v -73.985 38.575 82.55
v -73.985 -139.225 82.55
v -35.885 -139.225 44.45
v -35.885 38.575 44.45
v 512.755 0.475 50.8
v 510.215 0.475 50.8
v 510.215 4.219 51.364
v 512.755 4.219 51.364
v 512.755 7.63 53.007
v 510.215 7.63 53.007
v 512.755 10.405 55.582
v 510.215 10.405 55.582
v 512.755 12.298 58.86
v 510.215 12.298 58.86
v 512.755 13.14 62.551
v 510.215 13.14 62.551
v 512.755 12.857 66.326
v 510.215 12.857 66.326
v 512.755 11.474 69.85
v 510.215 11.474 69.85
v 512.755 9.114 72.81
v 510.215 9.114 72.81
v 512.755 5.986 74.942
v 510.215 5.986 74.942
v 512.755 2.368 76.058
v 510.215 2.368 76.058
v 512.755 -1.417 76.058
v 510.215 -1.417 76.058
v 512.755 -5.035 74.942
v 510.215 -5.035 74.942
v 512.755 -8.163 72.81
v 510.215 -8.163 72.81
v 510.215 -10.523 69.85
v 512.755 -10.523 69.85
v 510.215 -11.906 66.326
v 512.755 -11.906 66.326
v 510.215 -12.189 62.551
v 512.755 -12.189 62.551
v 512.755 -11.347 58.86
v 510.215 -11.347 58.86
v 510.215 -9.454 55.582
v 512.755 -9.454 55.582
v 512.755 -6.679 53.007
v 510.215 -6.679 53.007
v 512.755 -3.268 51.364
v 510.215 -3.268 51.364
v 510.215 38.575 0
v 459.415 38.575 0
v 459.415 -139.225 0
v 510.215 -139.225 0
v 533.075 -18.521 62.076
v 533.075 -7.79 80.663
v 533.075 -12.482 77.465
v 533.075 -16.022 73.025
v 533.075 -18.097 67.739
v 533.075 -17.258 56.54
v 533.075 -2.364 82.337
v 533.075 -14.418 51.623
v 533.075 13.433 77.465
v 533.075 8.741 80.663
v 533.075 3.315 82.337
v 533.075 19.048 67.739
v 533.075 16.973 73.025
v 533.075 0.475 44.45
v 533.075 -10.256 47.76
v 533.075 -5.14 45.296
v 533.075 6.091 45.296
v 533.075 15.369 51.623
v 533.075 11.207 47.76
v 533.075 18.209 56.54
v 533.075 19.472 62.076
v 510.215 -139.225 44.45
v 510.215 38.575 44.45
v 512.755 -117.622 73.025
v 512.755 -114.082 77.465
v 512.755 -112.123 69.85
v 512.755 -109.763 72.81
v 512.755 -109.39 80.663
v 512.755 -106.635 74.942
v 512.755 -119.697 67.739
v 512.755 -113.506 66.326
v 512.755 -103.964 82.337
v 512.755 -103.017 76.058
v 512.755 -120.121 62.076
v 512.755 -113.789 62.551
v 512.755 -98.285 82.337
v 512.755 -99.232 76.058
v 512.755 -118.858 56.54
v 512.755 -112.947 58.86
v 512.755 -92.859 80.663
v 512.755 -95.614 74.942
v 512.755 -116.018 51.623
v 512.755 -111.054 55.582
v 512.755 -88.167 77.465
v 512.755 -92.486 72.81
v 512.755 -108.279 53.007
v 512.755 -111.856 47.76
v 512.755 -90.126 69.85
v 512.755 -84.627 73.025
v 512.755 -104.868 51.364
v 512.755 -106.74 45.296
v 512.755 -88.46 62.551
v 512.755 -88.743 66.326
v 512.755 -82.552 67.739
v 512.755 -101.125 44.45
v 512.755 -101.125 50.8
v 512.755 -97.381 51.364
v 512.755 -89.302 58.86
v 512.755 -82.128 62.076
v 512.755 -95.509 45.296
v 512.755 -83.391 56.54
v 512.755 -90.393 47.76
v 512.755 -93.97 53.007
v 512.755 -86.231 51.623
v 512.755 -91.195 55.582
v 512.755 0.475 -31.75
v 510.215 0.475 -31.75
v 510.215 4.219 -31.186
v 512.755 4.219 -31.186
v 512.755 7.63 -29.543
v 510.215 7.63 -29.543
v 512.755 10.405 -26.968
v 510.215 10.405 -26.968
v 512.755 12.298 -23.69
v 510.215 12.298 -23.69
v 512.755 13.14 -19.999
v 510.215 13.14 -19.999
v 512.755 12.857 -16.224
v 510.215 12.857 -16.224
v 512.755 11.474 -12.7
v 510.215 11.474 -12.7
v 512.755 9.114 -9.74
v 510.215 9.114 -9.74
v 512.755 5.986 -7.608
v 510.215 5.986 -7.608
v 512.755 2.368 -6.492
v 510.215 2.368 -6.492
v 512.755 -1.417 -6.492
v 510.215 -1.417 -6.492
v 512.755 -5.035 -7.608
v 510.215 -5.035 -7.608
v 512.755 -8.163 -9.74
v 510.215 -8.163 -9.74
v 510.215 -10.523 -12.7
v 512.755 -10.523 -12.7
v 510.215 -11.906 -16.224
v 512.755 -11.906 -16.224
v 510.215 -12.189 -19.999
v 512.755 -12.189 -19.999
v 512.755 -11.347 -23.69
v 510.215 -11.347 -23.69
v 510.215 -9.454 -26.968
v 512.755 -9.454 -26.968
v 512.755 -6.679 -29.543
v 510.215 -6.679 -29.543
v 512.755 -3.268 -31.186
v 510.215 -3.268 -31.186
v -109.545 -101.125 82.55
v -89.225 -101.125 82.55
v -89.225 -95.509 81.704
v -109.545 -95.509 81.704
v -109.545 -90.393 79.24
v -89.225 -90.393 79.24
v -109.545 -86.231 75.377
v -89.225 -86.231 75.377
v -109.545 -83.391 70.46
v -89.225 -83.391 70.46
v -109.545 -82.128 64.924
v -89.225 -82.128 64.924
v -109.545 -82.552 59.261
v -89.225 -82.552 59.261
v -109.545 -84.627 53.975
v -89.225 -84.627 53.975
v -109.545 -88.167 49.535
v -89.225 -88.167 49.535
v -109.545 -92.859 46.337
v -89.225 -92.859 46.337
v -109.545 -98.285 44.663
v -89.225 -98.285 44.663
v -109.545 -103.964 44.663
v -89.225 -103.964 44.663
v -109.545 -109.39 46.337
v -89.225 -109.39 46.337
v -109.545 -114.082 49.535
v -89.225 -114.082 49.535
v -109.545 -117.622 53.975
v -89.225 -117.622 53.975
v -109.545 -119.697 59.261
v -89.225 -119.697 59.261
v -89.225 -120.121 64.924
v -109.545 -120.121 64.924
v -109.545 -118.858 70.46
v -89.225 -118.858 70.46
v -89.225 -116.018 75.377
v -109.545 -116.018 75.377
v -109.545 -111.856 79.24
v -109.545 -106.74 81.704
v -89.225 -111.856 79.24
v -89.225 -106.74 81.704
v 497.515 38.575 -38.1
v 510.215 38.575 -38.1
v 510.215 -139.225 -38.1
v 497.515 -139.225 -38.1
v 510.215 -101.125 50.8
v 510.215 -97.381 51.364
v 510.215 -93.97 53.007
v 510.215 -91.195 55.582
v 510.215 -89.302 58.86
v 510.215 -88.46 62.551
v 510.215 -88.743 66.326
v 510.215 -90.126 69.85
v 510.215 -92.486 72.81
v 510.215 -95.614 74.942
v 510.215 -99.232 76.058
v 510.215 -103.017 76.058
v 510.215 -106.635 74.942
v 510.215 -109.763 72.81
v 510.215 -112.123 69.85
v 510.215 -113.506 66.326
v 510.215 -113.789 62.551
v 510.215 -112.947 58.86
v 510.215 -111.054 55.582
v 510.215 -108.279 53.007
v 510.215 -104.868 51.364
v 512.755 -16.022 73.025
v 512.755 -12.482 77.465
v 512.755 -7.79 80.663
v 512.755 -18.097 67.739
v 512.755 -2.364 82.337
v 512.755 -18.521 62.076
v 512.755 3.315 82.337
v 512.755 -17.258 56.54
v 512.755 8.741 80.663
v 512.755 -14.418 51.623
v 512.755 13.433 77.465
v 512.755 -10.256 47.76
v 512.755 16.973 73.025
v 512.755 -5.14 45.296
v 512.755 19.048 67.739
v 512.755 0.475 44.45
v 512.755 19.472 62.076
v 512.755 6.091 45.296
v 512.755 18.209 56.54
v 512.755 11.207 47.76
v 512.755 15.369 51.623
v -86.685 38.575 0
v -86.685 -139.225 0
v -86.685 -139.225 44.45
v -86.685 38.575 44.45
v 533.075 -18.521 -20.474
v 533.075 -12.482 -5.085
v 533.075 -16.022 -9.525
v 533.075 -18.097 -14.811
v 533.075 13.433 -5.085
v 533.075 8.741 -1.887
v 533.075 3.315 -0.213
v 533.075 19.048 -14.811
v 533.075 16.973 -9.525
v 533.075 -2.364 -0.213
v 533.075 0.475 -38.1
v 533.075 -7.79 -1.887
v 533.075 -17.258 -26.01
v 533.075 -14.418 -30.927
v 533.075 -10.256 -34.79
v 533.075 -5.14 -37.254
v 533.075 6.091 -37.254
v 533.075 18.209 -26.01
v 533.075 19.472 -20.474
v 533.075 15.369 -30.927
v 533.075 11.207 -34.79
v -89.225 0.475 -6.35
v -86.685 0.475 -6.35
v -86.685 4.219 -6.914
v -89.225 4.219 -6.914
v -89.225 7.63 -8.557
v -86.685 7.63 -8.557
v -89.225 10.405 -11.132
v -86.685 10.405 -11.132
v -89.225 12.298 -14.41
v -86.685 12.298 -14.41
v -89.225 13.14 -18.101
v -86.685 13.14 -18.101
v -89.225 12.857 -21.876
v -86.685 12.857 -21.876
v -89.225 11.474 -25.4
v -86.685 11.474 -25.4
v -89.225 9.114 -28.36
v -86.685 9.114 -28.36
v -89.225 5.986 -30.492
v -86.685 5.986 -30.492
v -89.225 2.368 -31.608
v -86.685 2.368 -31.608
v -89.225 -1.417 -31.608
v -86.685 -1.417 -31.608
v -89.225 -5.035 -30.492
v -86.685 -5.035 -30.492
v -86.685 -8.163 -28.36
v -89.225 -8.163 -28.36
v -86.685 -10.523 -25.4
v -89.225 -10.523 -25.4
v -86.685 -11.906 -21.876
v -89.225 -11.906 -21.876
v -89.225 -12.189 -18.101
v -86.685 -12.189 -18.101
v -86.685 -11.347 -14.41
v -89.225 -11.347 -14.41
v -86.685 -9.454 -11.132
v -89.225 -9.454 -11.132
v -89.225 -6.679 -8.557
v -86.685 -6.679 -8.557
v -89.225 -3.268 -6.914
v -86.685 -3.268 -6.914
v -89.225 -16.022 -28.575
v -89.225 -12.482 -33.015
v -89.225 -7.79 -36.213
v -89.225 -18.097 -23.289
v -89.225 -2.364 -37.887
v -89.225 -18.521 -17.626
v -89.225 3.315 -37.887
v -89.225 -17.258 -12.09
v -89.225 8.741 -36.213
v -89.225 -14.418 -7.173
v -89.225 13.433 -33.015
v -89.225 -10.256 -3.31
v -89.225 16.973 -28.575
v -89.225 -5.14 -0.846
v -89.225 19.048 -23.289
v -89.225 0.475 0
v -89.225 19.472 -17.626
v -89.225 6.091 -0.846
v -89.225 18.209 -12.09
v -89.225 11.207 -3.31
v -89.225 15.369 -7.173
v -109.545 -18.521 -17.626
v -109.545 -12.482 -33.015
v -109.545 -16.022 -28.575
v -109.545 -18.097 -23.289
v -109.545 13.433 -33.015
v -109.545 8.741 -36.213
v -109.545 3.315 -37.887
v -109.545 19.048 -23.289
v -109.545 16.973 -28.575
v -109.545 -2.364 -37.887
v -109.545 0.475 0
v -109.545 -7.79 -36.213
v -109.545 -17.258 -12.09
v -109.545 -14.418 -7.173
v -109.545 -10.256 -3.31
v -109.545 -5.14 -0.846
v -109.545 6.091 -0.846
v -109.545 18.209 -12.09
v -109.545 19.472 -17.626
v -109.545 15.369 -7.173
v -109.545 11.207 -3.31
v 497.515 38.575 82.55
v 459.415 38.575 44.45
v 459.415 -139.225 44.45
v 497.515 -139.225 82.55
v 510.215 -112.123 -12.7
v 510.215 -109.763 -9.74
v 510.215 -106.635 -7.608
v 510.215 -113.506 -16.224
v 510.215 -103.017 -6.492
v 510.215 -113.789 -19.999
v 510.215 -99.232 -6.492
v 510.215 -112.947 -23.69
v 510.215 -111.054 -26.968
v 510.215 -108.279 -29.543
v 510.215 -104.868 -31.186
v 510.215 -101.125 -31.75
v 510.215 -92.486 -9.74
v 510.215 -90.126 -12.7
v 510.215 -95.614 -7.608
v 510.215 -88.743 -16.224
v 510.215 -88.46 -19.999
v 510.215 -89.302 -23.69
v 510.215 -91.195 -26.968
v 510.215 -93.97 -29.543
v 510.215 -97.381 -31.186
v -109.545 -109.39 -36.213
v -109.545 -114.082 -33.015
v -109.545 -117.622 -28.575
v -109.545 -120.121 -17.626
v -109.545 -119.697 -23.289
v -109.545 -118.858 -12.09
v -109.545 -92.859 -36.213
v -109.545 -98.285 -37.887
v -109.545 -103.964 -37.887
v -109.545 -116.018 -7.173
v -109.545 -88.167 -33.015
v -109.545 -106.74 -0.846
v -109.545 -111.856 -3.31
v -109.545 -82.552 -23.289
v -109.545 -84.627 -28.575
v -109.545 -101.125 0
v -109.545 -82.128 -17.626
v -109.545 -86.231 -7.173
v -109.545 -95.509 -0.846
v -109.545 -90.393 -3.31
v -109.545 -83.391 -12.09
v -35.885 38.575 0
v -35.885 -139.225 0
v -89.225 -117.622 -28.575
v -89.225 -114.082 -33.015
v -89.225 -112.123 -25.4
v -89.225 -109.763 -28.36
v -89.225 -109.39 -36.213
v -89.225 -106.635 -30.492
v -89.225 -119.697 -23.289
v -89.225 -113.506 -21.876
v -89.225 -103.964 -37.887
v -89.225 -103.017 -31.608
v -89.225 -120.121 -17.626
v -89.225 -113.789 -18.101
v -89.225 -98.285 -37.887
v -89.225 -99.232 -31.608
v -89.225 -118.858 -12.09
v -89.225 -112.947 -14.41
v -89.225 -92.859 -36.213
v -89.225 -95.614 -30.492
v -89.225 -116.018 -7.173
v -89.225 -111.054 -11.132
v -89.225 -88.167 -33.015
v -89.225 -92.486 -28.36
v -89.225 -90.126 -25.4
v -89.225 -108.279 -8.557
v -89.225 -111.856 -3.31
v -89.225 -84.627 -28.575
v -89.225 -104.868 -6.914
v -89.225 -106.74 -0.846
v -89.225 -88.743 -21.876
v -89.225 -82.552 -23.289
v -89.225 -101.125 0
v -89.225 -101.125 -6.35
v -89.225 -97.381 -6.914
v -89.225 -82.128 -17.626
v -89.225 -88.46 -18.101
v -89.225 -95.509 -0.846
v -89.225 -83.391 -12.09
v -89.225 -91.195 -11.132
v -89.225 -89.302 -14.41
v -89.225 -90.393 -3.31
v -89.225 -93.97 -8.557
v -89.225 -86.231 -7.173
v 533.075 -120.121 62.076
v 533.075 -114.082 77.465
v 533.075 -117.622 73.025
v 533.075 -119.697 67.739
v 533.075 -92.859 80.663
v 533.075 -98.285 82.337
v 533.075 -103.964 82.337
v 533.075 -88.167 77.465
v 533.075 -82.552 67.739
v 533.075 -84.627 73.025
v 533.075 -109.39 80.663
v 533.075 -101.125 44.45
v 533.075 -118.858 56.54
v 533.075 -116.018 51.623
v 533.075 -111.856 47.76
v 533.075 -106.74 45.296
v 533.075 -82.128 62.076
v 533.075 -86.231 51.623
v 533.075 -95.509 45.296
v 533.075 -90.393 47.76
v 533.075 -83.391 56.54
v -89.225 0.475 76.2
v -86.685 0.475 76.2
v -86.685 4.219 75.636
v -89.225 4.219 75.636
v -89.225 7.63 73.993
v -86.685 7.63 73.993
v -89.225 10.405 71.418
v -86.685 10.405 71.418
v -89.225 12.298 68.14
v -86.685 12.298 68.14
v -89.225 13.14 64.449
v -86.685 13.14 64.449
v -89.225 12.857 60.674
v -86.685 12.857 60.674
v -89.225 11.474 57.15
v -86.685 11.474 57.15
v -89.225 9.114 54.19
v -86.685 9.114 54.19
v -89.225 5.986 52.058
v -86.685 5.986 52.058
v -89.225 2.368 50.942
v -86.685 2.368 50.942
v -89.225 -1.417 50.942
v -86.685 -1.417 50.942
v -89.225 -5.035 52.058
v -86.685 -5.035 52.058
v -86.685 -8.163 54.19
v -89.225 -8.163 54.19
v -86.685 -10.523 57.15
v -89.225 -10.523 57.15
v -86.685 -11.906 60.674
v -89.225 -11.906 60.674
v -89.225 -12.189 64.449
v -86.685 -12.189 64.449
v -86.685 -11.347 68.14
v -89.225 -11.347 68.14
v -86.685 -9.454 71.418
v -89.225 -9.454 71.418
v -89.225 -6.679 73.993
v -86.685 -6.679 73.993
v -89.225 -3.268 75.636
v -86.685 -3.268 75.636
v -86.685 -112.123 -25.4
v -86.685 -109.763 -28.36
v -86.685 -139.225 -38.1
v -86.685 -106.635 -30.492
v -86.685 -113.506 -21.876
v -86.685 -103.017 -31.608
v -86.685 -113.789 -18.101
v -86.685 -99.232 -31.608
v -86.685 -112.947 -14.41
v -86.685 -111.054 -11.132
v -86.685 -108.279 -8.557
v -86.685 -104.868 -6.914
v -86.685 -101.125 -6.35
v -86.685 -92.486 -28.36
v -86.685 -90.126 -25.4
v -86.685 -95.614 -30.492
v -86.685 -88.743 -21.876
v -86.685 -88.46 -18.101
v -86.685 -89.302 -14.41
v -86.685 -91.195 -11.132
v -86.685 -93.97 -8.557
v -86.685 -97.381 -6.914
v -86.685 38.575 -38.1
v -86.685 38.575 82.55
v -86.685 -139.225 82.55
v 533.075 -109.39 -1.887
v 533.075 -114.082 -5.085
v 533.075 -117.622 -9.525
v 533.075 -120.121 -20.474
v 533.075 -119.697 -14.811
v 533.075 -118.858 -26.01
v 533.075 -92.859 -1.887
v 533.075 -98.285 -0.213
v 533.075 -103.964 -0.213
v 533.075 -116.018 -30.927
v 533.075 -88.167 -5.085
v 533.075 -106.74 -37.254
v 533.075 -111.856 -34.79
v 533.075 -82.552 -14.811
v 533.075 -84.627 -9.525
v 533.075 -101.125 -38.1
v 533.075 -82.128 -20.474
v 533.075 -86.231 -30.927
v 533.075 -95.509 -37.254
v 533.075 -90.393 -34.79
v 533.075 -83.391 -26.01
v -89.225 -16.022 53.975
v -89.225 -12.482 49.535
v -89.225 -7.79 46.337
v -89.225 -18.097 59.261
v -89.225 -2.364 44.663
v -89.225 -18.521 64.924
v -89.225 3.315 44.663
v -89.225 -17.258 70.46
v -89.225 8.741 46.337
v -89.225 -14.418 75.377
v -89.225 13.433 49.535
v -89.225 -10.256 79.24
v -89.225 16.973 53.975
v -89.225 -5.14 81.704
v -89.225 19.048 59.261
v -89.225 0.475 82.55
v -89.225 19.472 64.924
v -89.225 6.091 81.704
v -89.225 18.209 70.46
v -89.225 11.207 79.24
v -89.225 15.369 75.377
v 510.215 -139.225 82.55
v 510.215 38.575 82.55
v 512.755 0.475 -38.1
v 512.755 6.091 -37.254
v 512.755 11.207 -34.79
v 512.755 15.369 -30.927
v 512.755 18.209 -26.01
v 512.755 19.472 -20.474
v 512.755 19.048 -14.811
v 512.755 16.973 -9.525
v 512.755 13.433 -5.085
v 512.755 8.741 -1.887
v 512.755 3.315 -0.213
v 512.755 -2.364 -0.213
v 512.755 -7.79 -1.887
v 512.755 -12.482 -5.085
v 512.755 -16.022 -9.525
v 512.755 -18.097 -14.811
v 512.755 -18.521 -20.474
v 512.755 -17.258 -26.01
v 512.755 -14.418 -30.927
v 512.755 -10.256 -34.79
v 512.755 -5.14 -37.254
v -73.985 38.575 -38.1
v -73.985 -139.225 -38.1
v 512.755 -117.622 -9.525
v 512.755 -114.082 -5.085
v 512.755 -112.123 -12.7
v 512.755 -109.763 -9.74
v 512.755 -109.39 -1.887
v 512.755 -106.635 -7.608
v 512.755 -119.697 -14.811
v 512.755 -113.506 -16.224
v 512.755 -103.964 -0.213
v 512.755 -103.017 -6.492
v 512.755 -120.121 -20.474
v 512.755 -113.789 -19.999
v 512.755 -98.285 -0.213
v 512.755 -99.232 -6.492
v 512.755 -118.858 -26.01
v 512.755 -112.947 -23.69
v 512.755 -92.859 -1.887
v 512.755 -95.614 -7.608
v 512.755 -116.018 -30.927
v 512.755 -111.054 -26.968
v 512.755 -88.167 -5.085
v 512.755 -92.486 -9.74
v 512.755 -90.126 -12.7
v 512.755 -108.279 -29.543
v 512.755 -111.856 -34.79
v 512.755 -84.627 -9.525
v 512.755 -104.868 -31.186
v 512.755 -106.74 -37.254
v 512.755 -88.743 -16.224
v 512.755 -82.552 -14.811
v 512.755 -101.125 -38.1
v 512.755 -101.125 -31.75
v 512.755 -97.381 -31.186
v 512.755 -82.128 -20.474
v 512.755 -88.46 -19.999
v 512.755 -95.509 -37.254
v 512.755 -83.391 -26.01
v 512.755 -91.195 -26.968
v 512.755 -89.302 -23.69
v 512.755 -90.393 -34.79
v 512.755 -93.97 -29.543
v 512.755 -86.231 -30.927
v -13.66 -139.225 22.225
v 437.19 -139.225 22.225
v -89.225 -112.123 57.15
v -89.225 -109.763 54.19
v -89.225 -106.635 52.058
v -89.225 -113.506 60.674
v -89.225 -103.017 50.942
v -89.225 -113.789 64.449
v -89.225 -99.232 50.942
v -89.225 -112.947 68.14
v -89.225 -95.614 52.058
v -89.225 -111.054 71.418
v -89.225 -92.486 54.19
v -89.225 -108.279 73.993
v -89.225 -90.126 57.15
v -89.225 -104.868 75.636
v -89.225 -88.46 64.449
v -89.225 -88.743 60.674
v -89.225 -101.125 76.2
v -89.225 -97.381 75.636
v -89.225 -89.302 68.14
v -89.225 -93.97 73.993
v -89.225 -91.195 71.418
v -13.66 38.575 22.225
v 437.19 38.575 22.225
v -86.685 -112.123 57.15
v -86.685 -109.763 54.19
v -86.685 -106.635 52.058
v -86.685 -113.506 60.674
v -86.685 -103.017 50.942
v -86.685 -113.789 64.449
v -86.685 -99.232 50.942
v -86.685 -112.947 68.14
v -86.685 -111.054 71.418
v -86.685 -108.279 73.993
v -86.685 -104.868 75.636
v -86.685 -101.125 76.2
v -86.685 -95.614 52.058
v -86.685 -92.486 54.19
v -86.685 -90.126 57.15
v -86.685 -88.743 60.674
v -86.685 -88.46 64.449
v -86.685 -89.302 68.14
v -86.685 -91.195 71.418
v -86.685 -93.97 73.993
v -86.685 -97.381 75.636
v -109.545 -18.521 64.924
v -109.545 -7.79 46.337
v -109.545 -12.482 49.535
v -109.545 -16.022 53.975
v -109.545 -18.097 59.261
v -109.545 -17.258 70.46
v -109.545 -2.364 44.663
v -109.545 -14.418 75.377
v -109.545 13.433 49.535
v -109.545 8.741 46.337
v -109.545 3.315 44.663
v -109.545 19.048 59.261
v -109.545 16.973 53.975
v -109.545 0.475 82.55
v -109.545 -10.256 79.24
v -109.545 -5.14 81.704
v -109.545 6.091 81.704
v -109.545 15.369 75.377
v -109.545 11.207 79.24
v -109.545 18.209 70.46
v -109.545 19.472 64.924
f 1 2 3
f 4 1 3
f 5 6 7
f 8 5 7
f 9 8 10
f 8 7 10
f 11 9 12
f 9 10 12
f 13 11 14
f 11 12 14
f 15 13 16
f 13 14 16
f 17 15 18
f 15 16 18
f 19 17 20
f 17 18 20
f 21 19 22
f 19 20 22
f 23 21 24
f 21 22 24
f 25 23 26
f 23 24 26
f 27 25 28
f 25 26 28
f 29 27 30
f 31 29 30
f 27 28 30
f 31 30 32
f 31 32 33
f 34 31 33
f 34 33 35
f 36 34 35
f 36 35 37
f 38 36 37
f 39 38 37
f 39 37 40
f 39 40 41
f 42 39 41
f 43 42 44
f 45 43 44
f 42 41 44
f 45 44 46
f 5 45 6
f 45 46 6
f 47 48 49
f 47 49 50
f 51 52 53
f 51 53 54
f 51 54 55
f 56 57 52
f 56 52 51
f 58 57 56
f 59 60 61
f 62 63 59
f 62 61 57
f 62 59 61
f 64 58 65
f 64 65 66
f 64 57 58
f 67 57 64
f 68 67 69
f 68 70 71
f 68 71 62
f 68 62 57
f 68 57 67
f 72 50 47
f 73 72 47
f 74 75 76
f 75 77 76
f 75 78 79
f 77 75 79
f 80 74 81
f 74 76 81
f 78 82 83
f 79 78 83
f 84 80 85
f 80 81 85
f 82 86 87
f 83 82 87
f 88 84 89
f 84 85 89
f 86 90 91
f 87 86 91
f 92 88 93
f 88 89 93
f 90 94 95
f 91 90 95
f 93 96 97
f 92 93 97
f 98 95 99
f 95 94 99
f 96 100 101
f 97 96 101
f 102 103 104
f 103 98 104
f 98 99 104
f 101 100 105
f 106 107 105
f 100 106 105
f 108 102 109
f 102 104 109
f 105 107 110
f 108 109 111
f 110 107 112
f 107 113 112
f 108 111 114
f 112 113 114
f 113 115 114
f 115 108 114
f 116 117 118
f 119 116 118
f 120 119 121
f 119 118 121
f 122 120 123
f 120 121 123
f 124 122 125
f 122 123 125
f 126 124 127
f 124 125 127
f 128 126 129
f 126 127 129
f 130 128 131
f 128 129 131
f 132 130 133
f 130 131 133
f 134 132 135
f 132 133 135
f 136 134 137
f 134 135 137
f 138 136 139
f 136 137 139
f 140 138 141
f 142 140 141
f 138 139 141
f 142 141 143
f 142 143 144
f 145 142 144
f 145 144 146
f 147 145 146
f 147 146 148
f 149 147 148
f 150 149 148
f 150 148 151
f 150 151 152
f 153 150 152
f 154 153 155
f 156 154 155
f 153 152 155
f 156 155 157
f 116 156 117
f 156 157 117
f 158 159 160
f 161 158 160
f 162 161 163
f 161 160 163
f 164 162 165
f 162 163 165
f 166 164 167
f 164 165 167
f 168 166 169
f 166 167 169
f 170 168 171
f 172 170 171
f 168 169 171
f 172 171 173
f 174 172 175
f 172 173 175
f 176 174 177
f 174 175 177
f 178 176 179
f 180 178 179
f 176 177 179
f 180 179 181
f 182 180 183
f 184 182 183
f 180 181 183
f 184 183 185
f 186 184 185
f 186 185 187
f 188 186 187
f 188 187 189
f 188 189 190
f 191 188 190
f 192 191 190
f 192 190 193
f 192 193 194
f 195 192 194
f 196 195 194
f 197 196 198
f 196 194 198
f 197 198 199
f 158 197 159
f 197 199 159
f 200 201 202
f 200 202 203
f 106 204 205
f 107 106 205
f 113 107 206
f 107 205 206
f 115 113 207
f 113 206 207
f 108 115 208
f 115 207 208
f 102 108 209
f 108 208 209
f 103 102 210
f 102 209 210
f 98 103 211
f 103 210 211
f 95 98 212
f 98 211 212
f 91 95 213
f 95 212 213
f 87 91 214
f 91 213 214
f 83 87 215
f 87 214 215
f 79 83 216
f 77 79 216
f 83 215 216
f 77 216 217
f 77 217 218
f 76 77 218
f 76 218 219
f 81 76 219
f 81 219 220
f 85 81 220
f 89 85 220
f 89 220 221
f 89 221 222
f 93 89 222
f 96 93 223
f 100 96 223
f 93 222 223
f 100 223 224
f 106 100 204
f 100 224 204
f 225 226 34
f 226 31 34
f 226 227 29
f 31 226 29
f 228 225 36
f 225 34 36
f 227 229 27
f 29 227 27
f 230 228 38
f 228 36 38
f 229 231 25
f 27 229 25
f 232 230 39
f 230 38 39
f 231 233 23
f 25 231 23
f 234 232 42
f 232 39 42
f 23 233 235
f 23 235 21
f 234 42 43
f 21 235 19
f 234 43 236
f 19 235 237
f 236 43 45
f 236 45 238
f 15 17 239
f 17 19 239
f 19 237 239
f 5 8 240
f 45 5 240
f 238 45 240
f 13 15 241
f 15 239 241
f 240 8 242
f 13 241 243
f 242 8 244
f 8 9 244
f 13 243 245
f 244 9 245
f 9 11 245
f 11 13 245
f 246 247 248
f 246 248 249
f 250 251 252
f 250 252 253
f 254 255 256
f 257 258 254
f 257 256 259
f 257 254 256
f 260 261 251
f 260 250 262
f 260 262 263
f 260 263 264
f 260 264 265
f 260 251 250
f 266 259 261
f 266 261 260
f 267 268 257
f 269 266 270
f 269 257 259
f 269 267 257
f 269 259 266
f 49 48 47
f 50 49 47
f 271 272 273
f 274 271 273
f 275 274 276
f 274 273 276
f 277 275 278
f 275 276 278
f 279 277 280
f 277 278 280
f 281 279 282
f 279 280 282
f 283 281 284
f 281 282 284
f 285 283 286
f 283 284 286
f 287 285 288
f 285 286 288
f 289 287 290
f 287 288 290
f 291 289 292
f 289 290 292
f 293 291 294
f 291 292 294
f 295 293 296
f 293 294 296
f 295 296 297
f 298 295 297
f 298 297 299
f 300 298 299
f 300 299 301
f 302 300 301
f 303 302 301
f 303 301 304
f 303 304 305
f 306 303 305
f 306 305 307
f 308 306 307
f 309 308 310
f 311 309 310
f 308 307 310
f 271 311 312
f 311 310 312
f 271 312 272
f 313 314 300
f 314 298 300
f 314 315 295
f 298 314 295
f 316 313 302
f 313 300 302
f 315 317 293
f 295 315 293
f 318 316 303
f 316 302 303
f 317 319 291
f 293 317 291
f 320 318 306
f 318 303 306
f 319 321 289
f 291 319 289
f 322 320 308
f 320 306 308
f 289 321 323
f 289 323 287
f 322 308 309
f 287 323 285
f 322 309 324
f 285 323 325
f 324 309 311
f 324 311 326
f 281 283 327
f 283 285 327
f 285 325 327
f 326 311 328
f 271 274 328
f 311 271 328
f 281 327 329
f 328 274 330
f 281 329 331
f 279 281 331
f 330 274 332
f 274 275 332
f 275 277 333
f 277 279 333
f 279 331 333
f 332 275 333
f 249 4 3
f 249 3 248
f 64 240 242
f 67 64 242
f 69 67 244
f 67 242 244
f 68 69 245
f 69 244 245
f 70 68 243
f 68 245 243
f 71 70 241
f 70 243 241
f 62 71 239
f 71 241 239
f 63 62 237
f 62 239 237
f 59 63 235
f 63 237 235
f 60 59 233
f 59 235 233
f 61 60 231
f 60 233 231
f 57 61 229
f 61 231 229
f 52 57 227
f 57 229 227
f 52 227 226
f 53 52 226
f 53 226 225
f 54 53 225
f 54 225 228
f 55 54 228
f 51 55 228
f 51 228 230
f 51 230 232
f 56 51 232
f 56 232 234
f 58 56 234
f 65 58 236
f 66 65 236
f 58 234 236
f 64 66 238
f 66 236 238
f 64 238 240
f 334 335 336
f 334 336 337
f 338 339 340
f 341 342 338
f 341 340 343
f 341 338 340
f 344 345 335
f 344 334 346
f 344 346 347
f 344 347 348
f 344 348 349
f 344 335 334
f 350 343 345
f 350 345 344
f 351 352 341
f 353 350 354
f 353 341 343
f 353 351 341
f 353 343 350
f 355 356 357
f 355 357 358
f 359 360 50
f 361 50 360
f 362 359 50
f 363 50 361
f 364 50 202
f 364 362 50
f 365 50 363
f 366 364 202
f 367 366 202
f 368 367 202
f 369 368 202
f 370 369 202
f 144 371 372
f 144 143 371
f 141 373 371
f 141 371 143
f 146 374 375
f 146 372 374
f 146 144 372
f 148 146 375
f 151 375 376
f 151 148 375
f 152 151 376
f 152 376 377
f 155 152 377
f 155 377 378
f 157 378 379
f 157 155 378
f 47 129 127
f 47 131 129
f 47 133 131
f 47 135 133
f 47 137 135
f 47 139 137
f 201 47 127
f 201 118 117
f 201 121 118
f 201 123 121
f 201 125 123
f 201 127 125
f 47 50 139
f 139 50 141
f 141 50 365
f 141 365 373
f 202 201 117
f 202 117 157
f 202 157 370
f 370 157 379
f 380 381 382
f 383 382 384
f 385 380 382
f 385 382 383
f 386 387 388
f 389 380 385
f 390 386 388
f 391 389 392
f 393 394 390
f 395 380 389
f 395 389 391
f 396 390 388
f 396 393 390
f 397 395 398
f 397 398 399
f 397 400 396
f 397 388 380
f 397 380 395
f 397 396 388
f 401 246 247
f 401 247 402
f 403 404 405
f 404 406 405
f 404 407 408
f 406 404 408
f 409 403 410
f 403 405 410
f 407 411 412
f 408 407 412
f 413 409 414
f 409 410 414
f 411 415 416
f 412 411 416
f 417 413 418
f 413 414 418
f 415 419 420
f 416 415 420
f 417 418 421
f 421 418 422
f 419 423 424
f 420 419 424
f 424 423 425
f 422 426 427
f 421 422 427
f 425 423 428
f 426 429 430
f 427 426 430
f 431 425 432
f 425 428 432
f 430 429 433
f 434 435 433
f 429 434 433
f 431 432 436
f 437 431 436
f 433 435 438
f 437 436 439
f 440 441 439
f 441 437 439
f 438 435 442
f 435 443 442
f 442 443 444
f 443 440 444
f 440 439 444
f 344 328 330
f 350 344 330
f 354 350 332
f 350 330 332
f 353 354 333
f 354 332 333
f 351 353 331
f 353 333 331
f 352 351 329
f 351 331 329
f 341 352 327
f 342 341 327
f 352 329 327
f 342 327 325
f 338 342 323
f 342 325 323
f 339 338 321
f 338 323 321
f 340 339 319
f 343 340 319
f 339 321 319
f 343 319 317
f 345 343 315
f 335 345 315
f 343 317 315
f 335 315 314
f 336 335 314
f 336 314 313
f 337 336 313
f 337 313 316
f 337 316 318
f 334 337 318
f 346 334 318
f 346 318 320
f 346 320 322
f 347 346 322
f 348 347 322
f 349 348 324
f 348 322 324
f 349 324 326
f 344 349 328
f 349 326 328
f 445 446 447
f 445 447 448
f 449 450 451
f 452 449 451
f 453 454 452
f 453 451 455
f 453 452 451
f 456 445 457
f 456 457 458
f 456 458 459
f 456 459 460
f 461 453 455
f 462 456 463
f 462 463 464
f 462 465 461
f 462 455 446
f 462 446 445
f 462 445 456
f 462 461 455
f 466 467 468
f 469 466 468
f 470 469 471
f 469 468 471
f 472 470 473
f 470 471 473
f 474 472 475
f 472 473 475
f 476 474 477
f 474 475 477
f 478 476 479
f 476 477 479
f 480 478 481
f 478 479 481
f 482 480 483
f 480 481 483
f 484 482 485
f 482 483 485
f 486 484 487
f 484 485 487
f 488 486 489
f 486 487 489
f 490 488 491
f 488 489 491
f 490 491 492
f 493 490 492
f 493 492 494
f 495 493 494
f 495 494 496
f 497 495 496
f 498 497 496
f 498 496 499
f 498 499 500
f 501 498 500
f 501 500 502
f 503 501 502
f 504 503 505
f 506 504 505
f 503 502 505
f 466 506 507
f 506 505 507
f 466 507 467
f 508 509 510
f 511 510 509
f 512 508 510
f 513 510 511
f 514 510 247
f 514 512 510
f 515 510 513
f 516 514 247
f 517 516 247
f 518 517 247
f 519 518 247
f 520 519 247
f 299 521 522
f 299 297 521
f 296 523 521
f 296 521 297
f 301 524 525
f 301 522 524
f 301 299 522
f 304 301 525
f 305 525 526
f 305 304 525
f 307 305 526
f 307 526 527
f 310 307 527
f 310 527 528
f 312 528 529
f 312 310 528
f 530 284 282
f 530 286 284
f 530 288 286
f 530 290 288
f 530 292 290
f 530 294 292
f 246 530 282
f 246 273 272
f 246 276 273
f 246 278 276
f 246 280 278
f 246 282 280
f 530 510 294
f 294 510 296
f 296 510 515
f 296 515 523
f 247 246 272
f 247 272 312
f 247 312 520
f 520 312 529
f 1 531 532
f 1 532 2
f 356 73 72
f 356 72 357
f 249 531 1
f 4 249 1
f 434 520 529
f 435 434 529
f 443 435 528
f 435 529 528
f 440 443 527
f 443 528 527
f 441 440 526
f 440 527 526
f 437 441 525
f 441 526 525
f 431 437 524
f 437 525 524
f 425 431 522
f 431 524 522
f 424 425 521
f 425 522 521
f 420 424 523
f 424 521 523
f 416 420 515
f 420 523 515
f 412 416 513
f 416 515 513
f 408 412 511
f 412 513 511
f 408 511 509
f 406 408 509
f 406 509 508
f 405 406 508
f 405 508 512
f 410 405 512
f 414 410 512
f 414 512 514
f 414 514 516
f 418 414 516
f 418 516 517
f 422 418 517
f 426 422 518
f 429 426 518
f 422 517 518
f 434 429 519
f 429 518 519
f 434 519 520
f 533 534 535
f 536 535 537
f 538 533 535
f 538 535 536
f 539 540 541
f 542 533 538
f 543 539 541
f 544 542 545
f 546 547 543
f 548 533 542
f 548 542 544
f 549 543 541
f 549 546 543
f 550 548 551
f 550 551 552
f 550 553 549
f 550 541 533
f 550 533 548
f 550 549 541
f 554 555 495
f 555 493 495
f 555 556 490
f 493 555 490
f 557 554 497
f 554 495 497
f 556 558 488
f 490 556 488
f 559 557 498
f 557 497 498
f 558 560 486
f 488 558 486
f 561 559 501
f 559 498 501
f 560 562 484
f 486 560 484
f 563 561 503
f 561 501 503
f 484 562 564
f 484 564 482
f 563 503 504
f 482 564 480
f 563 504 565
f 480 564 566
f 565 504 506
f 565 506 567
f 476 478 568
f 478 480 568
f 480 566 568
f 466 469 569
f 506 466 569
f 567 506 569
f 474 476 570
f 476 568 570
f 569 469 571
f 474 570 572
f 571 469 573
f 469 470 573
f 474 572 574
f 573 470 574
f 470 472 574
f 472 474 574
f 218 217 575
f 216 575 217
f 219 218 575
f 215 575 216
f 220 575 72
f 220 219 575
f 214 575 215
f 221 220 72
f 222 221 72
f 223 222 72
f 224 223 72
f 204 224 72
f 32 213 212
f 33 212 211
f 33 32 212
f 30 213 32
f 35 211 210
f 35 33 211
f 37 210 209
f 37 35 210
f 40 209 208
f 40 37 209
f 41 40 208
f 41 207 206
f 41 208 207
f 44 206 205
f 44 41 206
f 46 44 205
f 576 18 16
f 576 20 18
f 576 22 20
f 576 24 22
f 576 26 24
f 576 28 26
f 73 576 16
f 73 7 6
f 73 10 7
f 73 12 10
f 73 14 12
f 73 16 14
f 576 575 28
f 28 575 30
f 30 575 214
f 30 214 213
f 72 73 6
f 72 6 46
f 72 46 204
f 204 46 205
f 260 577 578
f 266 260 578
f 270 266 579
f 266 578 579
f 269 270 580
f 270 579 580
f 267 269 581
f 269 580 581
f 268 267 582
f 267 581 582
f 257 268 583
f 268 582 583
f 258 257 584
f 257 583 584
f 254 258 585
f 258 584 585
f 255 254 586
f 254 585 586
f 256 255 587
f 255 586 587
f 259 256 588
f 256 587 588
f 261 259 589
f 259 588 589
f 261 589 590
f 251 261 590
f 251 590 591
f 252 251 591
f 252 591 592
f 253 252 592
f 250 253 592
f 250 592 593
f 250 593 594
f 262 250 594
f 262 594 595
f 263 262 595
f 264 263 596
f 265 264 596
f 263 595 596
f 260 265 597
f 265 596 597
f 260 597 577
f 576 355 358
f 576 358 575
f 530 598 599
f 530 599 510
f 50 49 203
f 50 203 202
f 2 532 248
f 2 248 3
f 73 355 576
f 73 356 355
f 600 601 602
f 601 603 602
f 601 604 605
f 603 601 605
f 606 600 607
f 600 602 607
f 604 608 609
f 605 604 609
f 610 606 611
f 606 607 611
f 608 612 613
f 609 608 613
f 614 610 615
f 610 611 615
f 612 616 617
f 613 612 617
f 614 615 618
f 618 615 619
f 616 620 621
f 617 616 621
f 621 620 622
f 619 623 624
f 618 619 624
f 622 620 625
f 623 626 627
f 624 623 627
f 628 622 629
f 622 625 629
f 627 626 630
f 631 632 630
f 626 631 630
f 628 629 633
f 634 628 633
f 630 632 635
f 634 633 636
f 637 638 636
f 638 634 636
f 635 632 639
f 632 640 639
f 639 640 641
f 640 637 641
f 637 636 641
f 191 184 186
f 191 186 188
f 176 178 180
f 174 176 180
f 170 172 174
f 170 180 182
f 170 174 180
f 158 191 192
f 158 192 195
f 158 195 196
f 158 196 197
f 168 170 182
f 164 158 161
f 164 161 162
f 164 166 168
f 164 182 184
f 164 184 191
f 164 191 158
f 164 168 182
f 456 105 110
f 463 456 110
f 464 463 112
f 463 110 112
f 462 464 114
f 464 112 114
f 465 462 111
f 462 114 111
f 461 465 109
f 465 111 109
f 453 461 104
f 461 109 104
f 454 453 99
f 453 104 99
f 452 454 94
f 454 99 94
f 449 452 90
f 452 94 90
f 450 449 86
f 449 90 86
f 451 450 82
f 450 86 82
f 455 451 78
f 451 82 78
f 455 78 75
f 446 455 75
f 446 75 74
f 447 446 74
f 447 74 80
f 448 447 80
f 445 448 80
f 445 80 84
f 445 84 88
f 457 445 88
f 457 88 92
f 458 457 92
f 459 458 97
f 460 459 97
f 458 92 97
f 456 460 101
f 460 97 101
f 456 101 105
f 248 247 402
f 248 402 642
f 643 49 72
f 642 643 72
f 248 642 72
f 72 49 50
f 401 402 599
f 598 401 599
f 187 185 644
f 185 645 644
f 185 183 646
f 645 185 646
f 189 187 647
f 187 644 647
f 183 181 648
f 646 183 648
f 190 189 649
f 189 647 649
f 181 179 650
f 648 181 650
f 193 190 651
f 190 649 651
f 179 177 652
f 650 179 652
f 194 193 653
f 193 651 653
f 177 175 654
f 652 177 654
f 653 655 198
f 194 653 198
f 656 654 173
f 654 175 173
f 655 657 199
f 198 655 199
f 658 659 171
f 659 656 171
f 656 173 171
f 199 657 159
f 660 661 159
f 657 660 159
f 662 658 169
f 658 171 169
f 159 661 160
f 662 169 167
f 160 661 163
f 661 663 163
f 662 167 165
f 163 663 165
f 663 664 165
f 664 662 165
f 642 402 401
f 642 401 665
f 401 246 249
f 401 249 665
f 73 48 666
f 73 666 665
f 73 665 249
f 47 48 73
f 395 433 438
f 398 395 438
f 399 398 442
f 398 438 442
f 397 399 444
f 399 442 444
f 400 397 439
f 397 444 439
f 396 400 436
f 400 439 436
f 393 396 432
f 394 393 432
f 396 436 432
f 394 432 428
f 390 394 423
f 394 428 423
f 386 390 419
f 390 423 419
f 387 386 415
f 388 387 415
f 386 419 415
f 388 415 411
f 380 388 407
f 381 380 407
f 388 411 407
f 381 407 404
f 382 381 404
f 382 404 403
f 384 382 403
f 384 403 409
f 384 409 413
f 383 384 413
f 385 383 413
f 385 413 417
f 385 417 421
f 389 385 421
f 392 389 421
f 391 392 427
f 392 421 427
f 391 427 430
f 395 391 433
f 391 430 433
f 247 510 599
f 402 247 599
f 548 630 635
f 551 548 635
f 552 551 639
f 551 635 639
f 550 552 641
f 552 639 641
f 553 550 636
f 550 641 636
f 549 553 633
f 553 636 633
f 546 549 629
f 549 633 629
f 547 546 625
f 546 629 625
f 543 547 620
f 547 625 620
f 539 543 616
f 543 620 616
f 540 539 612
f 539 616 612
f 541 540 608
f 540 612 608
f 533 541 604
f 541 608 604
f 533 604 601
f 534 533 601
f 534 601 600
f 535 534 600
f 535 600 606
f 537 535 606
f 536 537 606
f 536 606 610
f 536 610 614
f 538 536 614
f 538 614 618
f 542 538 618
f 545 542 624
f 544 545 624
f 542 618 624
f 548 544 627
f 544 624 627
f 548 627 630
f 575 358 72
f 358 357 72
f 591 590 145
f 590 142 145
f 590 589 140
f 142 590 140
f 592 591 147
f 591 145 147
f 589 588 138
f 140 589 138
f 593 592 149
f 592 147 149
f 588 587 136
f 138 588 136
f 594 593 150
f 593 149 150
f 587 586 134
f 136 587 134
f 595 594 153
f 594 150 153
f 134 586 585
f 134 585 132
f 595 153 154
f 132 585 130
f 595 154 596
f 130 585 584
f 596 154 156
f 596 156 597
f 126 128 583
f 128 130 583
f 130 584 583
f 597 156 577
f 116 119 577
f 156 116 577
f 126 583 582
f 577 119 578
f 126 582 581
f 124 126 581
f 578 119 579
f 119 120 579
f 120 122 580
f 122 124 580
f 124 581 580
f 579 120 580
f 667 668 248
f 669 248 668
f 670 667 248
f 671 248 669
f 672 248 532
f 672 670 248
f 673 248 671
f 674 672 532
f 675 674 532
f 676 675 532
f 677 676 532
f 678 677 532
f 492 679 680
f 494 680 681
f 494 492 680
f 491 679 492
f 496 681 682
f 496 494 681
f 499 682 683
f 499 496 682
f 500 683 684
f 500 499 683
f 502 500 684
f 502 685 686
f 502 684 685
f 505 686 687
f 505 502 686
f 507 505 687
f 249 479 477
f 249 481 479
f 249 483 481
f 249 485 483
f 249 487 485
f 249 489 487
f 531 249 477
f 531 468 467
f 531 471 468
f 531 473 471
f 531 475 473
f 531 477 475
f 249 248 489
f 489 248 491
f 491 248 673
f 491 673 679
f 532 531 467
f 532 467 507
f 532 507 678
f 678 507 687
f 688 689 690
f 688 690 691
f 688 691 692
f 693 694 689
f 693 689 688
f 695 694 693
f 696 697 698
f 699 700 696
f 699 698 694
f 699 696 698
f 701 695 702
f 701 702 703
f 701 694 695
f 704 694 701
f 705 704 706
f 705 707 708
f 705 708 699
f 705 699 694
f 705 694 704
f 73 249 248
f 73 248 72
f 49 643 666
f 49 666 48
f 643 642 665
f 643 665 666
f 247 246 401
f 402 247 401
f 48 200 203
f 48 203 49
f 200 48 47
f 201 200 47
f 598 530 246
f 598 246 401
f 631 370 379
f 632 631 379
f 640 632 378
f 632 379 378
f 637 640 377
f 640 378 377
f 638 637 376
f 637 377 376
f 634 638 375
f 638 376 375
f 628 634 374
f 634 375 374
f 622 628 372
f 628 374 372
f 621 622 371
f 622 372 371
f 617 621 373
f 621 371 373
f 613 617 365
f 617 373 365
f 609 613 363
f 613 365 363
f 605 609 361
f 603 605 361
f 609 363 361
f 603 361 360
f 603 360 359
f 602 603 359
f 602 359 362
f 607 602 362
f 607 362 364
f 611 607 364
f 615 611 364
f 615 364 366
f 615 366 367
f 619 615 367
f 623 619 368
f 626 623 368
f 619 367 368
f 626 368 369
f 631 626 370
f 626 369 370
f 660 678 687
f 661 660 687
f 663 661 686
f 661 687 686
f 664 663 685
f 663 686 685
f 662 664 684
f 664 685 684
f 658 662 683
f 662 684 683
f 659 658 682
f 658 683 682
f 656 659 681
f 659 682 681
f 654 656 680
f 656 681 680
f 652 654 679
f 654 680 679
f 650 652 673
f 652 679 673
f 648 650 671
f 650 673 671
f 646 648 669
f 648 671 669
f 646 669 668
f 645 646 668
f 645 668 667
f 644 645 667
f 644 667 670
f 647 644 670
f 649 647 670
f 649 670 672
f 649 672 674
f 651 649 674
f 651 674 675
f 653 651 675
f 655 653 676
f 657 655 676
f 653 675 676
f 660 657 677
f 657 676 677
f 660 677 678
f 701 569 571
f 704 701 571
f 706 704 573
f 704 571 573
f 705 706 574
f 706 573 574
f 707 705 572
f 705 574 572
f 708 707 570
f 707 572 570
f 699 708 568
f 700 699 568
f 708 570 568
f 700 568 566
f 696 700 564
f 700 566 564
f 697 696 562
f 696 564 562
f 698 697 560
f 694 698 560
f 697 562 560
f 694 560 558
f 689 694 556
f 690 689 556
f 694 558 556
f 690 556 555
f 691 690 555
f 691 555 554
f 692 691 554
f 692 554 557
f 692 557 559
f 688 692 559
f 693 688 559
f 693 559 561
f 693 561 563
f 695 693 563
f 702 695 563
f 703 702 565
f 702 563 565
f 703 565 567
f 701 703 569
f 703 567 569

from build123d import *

# Parameters (mm, degrees)
SKETCH1_W             = 596.9
SKETCH1_H             = 177.8
BOSS_EXTRUDE1_DEPTH   = 44.45
BOSS_EXTRUDE2_DEPTH   = 177.8
BOSS_EXTRUDE2_2_DEPTH = 177.8
BOSS_EXTRUDE2_3_DEPTH = 177.8
BOSS_EXTRUDE2_4_DEPTH = 177.8
SKETCH3_R             = 12.7
BOSS_EXTRUDE3_DEPTH   = 2.54
SKETCH4_R             = 19.05
BOSS_EXTRUDE4_DEPTH   = 20.32
SKETCH5_R             = 19.05
BOSS_EXTRUDE5_DEPTH   = 20.32
SKETCH6_R             = 19.05
BOSS_EXTRUDE6_DEPTH   = 20.32
SKETCH7_R             = 19.05
BOSS_EXTRUDE7_DEPTH   = 20.32
SKETCH8_R             = 12.7
BOSS_EXTRUDE8_DEPTH   = 2.54
SKETCH9_R             = 19.05
BOSS_EXTRUDE9_DEPTH   = 20.32
SKETCH10_R            = 19.05
BOSS_EXTRUDE10_DEPTH  = 20.32
SKETCH11_R            = 19.05
BOSS_EXTRUDE11_DEPTH  = 20.32
SKETCH12_R            = 19.05
BOSS_EXTRUDE12_DEPTH  = 20.32
CUT_EXTRUDE1_DEPTH    = 304.8


with BuildPart() as part:
    # Sketch1 → Boss-Extrude1 (new body)
    with BuildSketch(Plane.XY):
        with Locations((211.765296898, -50.324573746)):
            Rectangle(SKETCH1_W, SKETCH1_H)
    extrude(amount=BOSS_EXTRUDE1_DEPTH)

    # Sketch13 → Cut-Extrude1 (cut)
    with BuildSketch(Plane.XZ.offset(139.224573746)):
        Polygon((459.415296898, 0), (-35.884703102, 0), (-13.659703102, 22.225), (437.190296898, 22.225), align=None)
    extrude(amount=-CUT_EXTRUDE1_DEPTH, mode=Mode.SUBTRACT)


with BuildPart() as body_2:
    # Sketch2 → Boss-Extrude2 (new body)
    with BuildSketch(Plane(origin=(0, 38.575426254, 0), x_dir=(1, 0, 0), z_dir=(0, 1, 0))):
        Polygon((497.515296898, -82.55), (510.215296898, -82.55), (510.215296898, -44.45), (459.415296898, -44.45), align=None)
    extrude(amount=-BOSS_EXTRUDE2_DEPTH)



with BuildPart() as body_3:
    # Sketch2 → Boss-Extrude2 2 (new body)
    with BuildSketch(Plane(origin=(0, 38.575426254, 0), x_dir=(1, 0, 0), z_dir=(0, 1, 0))):
        Polygon((459.415296898, 0), (510.215296898, 0), (510.215296898, 38.1), (497.515296898, 38.1), align=None)
    extrude(amount=-BOSS_EXTRUDE2_2_DEPTH)


with BuildPart() as body_4:
    # Sketch2 → Boss-Extrude2 3 (new body)
    with BuildSketch(Plane(origin=(0, 38.575426254, 0), x_dir=(1, 0, 0), z_dir=(0, 1, 0))):
        Polygon((-86.684703102, 38.1), (-86.684703102, 0), (-35.884703102, 0), (-73.984703102, 38.1), align=None)
    extrude(amount=-BOSS_EXTRUDE2_3_DEPTH)



with BuildPart() as body_5:
    # Sketch2 → Boss-Extrude2 4 (new body)
    with BuildSketch(Plane(origin=(0, 38.575426254, 0), x_dir=(1, 0, 0), z_dir=(0, 1, 0))):
        Polygon((-35.884703102, -44.45), (-86.684703102, -44.45), (-86.684703102, -82.55), (-73.984703102, -82.55), align=None)
    extrude(amount=-BOSS_EXTRUDE2_4_DEPTH)


with BuildPart() as body_2_1:
    add(body_2.part)

    add(body_3.part)  # Boss-Extrude3 merges body 3
    # Sketch3 → Boss-Extrude3 (add)
    with BuildSketch(Plane(origin=(510.215296898, 0, 0), x_dir=(0, 0, -1), z_dir=(1, 0, 0))):
        with Locations((-63.5, 0.475426254)):
            Circle(SKETCH3_R)
        with Locations((19.05, 0.475426254)):
            Circle(SKETCH3_R)
        with Locations((-63.5, -101.124573746)):
            Circle(SKETCH3_R)
        with Locations((19.05, -101.124573746)):
            Circle(SKETCH3_R)
    extrude(amount=BOSS_EXTRUDE3_DEPTH)

    # Sketch4 → Boss-Extrude4 (add)
    with BuildSketch(Plane(origin=(512.755296898, 0, 0), x_dir=(0, 0, -1), z_dir=(1, 0, 0))):
        with Locations((-63.5, 0.475426254)):
            Circle(SKETCH4_R)
    extrude(amount=BOSS_EXTRUDE4_DEPTH)

    # Sketch5 → Boss-Extrude5 (add)
    with BuildSketch(Plane(origin=(512.755296898, 0, 0), x_dir=(0, 0, -1), z_dir=(1, 0, 0))):
        with Locations((19.05, 0.475426254)):
            Circle(SKETCH5_R)
    extrude(amount=BOSS_EXTRUDE5_DEPTH)

    # Sketch6 → Boss-Extrude6 (add)
    with BuildSketch(Plane(origin=(512.755296898, 0, 0), x_dir=(0, 0, -1), z_dir=(1, 0, 0))):
        with Locations((19.05, -101.124573746)):
            Circle(SKETCH6_R)
    extrude(amount=BOSS_EXTRUDE6_DEPTH)

    # Sketch7 → Boss-Extrude7 (add)
    with BuildSketch(Plane(origin=(512.755296898, 0, 0), x_dir=(0, 0, -1), z_dir=(1, 0, 0))):
        with Locations((-63.5, -101.124573746)):
            Circle(SKETCH7_R)
    extrude(amount=BOSS_EXTRUDE7_DEPTH)


with BuildPart() as body_4_1:
    add(body_4.part)

    add(body_5.part)  # Boss-Extrude8 merges body 5
    # Sketch8 → Boss-Extrude8 (add)
    with BuildSketch(Plane.ZY.offset(86.684703102)):
        with Locations((-19.05, -101.124573746)):
            Circle(SKETCH8_R)
        with Locations((-19.05, 0.475426254)):
            Circle(SKETCH8_R)
        with Locations((63.5, 0.475426254)):
            Circle(SKETCH8_R)
        with Locations((63.5, -101.124573746)):
            Circle(SKETCH8_R)
    extrude(amount=BOSS_EXTRUDE8_DEPTH)

    # Sketch9 → Boss-Extrude9 (add)
    with BuildSketch(Plane.ZY.offset(89.224703102)):
        with Locations((63.5, -101.124573746)):
            Circle(SKETCH9_R)
    extrude(amount=BOSS_EXTRUDE9_DEPTH)

    # Sketch10 → Boss-Extrude10 (add)
    with BuildSketch(Plane.ZY.offset(89.224703102)):
        with Locations((63.5, 0.475426254)):
            Circle(SKETCH10_R)
    extrude(amount=BOSS_EXTRUDE10_DEPTH)

    # Sketch11 → Boss-Extrude11 (add)
    with BuildSketch(Plane.ZY.offset(89.224703102)):
        with Locations((-19.05, -101.124573746)):
            Circle(SKETCH11_R)
    extrude(amount=BOSS_EXTRUDE11_DEPTH)

    # Sketch12 → Boss-Extrude12 (add)
    with BuildSketch(Plane.ZY.offset(89.224703102)):
        with Locations((-19.05, 0.475426254)):
            Circle(SKETCH12_R)
    extrude(amount=BOSS_EXTRUDE12_DEPTH)


solid = Compound([part.part, body_2_1.part, body_4_1.part])
